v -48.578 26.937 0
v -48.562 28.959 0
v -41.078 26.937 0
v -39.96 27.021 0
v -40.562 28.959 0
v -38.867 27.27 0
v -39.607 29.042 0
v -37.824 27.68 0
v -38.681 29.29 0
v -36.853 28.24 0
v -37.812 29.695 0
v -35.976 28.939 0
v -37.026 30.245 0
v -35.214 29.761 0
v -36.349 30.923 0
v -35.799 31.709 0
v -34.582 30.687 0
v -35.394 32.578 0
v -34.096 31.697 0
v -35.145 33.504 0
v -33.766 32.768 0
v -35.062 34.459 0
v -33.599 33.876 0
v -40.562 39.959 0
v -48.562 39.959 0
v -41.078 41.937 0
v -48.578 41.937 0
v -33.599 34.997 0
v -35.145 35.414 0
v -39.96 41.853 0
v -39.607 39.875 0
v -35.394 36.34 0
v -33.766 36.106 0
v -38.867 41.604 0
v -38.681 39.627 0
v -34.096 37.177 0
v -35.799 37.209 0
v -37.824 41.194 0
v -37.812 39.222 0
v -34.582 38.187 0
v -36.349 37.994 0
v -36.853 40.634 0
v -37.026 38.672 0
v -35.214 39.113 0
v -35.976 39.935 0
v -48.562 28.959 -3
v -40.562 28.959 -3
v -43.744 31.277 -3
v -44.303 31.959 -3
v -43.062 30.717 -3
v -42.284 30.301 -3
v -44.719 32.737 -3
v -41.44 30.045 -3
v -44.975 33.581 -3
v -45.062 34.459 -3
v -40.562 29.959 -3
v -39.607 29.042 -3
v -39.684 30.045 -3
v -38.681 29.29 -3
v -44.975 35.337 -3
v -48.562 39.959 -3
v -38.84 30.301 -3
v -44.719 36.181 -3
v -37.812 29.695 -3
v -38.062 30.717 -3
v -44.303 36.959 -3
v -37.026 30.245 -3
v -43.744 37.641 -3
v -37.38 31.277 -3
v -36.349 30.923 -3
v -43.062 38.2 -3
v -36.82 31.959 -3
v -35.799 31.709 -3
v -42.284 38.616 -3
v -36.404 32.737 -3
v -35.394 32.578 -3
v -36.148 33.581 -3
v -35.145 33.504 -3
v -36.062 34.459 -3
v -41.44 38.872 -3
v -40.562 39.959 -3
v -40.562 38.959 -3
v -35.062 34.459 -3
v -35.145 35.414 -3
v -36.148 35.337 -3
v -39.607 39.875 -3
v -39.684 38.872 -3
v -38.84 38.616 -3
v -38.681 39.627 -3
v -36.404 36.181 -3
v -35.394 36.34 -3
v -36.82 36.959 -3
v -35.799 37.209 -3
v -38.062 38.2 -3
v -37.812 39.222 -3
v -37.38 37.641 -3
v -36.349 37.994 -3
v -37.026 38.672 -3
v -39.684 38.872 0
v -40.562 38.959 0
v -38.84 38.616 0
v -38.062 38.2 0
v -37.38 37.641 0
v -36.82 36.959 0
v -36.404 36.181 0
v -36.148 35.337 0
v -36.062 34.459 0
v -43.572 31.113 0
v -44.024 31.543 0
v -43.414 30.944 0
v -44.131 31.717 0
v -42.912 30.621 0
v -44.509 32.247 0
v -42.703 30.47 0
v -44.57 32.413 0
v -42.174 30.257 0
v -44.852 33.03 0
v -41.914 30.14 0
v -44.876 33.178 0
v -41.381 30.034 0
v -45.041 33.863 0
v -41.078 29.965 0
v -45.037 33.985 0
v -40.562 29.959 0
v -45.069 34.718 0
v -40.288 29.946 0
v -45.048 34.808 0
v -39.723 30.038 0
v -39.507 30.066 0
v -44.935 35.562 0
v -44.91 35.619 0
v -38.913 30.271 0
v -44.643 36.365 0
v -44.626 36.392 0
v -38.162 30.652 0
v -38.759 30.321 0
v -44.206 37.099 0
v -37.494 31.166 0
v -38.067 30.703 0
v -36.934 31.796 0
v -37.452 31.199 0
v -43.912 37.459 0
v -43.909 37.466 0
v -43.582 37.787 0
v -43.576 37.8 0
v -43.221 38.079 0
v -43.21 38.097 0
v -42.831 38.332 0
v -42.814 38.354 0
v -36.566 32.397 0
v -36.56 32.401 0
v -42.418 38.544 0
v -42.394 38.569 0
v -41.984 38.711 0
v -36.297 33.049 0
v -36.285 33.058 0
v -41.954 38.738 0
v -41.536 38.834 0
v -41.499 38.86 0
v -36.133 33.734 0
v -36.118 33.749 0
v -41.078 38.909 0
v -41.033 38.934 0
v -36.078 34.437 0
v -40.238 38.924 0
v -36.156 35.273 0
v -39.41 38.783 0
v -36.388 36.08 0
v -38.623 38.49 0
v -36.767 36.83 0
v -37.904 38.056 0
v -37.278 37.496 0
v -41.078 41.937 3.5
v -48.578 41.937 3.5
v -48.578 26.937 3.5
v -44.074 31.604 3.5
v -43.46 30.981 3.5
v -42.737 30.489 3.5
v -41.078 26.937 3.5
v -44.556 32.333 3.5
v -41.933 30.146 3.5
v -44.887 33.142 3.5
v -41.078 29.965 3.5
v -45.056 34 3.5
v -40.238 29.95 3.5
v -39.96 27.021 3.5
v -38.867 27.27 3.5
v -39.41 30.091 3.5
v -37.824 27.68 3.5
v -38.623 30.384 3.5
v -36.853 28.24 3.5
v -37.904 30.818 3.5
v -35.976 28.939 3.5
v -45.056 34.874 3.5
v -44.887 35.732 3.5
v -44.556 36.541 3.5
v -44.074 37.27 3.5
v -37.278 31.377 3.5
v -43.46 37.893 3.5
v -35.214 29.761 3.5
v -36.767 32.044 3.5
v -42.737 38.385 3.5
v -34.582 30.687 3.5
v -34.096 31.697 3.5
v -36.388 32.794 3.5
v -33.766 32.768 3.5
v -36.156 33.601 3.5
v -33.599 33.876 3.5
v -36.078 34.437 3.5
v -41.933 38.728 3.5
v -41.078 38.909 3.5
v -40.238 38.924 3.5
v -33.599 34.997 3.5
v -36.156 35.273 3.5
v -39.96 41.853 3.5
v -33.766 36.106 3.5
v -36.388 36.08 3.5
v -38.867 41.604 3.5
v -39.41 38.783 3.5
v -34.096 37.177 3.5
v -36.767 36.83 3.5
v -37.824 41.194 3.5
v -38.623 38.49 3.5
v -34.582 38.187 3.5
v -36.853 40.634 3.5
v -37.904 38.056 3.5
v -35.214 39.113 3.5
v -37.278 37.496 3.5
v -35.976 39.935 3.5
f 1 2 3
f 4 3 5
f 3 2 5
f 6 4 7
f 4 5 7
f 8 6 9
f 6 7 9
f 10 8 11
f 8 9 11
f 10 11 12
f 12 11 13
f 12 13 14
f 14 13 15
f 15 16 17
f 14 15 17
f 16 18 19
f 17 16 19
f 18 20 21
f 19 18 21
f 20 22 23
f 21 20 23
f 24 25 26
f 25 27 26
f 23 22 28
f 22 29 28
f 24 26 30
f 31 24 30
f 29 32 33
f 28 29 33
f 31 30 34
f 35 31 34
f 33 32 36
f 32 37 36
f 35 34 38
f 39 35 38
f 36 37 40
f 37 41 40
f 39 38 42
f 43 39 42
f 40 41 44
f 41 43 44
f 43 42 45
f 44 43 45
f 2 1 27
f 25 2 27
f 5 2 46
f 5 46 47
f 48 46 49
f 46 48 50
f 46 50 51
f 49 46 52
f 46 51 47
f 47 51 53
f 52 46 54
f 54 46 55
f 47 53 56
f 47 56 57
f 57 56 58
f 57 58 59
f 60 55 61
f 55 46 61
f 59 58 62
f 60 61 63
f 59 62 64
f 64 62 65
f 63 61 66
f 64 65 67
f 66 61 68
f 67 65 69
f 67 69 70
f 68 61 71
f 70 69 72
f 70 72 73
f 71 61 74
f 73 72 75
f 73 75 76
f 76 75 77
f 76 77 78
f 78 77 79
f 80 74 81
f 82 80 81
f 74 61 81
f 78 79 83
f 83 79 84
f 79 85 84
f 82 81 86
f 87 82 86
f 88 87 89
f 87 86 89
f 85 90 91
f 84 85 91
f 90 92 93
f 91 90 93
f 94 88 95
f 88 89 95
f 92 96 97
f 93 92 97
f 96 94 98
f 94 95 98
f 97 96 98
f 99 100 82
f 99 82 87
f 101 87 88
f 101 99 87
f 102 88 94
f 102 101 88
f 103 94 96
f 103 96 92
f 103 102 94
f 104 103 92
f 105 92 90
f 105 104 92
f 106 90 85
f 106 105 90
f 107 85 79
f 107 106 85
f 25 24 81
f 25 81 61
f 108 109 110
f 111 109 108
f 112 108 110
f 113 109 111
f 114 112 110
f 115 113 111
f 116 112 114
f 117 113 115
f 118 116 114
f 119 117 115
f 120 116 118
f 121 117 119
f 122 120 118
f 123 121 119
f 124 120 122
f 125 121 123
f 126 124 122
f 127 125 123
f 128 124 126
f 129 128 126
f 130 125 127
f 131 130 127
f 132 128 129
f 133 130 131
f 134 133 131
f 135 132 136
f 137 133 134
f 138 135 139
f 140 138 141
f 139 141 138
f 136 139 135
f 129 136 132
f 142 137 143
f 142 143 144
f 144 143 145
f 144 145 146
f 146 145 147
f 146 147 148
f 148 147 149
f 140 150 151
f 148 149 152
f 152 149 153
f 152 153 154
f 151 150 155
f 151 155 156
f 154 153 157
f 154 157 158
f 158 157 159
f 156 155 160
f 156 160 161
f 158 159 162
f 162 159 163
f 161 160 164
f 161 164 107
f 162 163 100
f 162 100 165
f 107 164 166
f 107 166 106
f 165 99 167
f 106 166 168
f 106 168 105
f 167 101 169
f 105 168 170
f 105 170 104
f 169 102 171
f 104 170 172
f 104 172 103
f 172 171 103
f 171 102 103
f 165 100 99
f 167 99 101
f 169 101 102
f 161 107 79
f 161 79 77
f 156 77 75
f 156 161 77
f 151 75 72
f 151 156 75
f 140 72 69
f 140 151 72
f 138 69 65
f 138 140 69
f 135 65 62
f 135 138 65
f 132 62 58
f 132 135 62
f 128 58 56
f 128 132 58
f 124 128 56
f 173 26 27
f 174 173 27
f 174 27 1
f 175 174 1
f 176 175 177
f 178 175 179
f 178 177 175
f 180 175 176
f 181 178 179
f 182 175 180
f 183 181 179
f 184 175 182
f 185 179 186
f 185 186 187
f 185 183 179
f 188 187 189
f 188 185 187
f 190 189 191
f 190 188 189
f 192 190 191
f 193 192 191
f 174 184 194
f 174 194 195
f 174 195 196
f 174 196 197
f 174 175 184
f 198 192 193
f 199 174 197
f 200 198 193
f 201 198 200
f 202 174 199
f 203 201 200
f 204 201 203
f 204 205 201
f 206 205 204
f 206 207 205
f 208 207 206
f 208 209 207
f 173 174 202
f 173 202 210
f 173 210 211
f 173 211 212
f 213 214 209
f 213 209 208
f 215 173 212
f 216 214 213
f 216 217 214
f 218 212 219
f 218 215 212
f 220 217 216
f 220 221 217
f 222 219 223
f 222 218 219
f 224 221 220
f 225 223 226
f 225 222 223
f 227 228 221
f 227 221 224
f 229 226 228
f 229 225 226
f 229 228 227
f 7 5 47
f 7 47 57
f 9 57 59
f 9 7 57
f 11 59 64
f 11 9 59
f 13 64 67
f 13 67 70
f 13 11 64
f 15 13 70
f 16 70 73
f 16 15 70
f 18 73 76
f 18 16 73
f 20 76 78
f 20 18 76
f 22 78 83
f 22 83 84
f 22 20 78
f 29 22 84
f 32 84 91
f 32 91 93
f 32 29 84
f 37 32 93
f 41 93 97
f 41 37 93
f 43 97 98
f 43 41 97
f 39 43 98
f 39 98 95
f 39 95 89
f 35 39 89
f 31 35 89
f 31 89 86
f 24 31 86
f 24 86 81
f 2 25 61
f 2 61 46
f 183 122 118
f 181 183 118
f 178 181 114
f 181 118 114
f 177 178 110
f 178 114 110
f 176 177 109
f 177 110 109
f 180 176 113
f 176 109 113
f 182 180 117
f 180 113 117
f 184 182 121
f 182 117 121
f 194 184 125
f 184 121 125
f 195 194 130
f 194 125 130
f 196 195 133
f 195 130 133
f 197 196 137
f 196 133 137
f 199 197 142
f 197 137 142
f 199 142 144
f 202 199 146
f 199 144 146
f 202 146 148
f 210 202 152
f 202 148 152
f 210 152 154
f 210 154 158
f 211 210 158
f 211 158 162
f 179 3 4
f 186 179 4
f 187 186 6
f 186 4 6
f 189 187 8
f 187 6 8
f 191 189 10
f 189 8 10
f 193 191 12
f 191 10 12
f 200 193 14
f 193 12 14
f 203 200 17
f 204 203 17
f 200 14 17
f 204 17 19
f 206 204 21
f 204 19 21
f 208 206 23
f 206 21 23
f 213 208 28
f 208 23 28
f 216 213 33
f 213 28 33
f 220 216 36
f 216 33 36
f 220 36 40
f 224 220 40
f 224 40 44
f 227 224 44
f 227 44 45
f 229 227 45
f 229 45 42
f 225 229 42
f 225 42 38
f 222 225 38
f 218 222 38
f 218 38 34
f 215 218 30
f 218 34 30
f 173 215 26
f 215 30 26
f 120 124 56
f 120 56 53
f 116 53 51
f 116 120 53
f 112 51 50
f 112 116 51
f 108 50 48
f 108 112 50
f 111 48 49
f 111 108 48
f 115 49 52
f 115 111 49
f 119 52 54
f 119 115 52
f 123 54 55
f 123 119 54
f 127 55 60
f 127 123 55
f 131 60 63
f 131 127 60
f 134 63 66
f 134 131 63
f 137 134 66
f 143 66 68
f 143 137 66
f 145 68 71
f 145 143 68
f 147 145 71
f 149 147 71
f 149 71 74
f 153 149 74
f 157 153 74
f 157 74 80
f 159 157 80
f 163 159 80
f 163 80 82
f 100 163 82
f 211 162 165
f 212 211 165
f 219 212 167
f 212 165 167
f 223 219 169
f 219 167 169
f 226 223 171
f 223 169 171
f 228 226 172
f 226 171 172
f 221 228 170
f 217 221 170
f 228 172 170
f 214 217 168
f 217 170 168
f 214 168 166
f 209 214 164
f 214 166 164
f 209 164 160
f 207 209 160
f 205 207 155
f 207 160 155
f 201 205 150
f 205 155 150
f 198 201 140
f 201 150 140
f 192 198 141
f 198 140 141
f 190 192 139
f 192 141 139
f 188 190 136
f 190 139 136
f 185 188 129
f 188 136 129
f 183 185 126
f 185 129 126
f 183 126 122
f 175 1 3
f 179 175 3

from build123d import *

# Parameters (mm, degrees)
F1_DEPTH = 3.5
F3_DEPTH = 3


with BuildPart() as f1:
    # F0 (on Top) → F1 (new body)
    with BuildSketch(Plane.XY):
        with BuildLine():
            Line((-41.077644, 41.93693), (-48.577644, 41.93693))
            Line((-48.577644, 41.93693), (-48.577644, 26.93693))
            Line((-48.577644, 26.93693), (-41.077644, 26.93693))
            Line((-41.077644, 26.93693), (-41.077644, 29.964794))
            ThreePointArc((-41.077644, 29.964794), (-45.077644, 34.43693), (-41.077644, 38.909066))
            Line((-41.077644, 38.909066), (-41.077644, 41.93693))
        make_face()
        with BuildLine():
            ThreePointArc((-41.077644, 26.93693), (-33.577644, 34.43693), (-41.077644, 41.93693))
            Line((-41.077644, 41.93693), (-41.077644, 38.909066))
            ThreePointArc((-41.077644, 38.909066), (-37.577644, 37.791032), (-36.077644, 34.43693))
            ThreePointArc((-36.077644, 34.43693), (-37.577644, 31.082828), (-41.077644, 29.964794))
            Line((-41.077644, 29.964794), (-41.077644, 26.93693))
        make_face()
    extrude(amount=F1_DEPTH)

    # F2 (on Top) → F3 (join)
    with BuildSketch(Plane.XY):
        with BuildLine():
            Line((-40.561818, 39.95863), (-48.561818, 39.95863))
            Line((-48.561818, 39.95863), (-48.561818, 28.95863))
            Line((-48.561818, 28.95863), (-40.561818, 28.95863))
            Line((-40.561818, 28.95863), (-40.561818, 29.95863))
            ThreePointArc((-40.561818, 29.95863), (-45.061818, 34.45863), (-40.561818, 38.95863))
            Line((-40.561818, 38.95863), (-40.561818, 39.95863))
        make_face()
        with BuildLine():
            ThreePointArc((-40.561818, 28.95863), (-35.061818, 34.45863), (-40.561818, 39.95863))
            Line((-40.561818, 39.95863), (-40.561818, 38.95863))
            ThreePointArc((-40.561818, 38.95863), (-37.379837, 37.64061), (-36.061818, 34.45863))
            ThreePointArc((-36.061818, 34.45863), (-37.379837, 31.276649), (-40.561818, 29.95863))
            Line((-40.561818, 29.95863), (-40.561818, 28.95863))
        make_face()
    extrude(amount=-F3_DEPTH)


solid = f1.part
